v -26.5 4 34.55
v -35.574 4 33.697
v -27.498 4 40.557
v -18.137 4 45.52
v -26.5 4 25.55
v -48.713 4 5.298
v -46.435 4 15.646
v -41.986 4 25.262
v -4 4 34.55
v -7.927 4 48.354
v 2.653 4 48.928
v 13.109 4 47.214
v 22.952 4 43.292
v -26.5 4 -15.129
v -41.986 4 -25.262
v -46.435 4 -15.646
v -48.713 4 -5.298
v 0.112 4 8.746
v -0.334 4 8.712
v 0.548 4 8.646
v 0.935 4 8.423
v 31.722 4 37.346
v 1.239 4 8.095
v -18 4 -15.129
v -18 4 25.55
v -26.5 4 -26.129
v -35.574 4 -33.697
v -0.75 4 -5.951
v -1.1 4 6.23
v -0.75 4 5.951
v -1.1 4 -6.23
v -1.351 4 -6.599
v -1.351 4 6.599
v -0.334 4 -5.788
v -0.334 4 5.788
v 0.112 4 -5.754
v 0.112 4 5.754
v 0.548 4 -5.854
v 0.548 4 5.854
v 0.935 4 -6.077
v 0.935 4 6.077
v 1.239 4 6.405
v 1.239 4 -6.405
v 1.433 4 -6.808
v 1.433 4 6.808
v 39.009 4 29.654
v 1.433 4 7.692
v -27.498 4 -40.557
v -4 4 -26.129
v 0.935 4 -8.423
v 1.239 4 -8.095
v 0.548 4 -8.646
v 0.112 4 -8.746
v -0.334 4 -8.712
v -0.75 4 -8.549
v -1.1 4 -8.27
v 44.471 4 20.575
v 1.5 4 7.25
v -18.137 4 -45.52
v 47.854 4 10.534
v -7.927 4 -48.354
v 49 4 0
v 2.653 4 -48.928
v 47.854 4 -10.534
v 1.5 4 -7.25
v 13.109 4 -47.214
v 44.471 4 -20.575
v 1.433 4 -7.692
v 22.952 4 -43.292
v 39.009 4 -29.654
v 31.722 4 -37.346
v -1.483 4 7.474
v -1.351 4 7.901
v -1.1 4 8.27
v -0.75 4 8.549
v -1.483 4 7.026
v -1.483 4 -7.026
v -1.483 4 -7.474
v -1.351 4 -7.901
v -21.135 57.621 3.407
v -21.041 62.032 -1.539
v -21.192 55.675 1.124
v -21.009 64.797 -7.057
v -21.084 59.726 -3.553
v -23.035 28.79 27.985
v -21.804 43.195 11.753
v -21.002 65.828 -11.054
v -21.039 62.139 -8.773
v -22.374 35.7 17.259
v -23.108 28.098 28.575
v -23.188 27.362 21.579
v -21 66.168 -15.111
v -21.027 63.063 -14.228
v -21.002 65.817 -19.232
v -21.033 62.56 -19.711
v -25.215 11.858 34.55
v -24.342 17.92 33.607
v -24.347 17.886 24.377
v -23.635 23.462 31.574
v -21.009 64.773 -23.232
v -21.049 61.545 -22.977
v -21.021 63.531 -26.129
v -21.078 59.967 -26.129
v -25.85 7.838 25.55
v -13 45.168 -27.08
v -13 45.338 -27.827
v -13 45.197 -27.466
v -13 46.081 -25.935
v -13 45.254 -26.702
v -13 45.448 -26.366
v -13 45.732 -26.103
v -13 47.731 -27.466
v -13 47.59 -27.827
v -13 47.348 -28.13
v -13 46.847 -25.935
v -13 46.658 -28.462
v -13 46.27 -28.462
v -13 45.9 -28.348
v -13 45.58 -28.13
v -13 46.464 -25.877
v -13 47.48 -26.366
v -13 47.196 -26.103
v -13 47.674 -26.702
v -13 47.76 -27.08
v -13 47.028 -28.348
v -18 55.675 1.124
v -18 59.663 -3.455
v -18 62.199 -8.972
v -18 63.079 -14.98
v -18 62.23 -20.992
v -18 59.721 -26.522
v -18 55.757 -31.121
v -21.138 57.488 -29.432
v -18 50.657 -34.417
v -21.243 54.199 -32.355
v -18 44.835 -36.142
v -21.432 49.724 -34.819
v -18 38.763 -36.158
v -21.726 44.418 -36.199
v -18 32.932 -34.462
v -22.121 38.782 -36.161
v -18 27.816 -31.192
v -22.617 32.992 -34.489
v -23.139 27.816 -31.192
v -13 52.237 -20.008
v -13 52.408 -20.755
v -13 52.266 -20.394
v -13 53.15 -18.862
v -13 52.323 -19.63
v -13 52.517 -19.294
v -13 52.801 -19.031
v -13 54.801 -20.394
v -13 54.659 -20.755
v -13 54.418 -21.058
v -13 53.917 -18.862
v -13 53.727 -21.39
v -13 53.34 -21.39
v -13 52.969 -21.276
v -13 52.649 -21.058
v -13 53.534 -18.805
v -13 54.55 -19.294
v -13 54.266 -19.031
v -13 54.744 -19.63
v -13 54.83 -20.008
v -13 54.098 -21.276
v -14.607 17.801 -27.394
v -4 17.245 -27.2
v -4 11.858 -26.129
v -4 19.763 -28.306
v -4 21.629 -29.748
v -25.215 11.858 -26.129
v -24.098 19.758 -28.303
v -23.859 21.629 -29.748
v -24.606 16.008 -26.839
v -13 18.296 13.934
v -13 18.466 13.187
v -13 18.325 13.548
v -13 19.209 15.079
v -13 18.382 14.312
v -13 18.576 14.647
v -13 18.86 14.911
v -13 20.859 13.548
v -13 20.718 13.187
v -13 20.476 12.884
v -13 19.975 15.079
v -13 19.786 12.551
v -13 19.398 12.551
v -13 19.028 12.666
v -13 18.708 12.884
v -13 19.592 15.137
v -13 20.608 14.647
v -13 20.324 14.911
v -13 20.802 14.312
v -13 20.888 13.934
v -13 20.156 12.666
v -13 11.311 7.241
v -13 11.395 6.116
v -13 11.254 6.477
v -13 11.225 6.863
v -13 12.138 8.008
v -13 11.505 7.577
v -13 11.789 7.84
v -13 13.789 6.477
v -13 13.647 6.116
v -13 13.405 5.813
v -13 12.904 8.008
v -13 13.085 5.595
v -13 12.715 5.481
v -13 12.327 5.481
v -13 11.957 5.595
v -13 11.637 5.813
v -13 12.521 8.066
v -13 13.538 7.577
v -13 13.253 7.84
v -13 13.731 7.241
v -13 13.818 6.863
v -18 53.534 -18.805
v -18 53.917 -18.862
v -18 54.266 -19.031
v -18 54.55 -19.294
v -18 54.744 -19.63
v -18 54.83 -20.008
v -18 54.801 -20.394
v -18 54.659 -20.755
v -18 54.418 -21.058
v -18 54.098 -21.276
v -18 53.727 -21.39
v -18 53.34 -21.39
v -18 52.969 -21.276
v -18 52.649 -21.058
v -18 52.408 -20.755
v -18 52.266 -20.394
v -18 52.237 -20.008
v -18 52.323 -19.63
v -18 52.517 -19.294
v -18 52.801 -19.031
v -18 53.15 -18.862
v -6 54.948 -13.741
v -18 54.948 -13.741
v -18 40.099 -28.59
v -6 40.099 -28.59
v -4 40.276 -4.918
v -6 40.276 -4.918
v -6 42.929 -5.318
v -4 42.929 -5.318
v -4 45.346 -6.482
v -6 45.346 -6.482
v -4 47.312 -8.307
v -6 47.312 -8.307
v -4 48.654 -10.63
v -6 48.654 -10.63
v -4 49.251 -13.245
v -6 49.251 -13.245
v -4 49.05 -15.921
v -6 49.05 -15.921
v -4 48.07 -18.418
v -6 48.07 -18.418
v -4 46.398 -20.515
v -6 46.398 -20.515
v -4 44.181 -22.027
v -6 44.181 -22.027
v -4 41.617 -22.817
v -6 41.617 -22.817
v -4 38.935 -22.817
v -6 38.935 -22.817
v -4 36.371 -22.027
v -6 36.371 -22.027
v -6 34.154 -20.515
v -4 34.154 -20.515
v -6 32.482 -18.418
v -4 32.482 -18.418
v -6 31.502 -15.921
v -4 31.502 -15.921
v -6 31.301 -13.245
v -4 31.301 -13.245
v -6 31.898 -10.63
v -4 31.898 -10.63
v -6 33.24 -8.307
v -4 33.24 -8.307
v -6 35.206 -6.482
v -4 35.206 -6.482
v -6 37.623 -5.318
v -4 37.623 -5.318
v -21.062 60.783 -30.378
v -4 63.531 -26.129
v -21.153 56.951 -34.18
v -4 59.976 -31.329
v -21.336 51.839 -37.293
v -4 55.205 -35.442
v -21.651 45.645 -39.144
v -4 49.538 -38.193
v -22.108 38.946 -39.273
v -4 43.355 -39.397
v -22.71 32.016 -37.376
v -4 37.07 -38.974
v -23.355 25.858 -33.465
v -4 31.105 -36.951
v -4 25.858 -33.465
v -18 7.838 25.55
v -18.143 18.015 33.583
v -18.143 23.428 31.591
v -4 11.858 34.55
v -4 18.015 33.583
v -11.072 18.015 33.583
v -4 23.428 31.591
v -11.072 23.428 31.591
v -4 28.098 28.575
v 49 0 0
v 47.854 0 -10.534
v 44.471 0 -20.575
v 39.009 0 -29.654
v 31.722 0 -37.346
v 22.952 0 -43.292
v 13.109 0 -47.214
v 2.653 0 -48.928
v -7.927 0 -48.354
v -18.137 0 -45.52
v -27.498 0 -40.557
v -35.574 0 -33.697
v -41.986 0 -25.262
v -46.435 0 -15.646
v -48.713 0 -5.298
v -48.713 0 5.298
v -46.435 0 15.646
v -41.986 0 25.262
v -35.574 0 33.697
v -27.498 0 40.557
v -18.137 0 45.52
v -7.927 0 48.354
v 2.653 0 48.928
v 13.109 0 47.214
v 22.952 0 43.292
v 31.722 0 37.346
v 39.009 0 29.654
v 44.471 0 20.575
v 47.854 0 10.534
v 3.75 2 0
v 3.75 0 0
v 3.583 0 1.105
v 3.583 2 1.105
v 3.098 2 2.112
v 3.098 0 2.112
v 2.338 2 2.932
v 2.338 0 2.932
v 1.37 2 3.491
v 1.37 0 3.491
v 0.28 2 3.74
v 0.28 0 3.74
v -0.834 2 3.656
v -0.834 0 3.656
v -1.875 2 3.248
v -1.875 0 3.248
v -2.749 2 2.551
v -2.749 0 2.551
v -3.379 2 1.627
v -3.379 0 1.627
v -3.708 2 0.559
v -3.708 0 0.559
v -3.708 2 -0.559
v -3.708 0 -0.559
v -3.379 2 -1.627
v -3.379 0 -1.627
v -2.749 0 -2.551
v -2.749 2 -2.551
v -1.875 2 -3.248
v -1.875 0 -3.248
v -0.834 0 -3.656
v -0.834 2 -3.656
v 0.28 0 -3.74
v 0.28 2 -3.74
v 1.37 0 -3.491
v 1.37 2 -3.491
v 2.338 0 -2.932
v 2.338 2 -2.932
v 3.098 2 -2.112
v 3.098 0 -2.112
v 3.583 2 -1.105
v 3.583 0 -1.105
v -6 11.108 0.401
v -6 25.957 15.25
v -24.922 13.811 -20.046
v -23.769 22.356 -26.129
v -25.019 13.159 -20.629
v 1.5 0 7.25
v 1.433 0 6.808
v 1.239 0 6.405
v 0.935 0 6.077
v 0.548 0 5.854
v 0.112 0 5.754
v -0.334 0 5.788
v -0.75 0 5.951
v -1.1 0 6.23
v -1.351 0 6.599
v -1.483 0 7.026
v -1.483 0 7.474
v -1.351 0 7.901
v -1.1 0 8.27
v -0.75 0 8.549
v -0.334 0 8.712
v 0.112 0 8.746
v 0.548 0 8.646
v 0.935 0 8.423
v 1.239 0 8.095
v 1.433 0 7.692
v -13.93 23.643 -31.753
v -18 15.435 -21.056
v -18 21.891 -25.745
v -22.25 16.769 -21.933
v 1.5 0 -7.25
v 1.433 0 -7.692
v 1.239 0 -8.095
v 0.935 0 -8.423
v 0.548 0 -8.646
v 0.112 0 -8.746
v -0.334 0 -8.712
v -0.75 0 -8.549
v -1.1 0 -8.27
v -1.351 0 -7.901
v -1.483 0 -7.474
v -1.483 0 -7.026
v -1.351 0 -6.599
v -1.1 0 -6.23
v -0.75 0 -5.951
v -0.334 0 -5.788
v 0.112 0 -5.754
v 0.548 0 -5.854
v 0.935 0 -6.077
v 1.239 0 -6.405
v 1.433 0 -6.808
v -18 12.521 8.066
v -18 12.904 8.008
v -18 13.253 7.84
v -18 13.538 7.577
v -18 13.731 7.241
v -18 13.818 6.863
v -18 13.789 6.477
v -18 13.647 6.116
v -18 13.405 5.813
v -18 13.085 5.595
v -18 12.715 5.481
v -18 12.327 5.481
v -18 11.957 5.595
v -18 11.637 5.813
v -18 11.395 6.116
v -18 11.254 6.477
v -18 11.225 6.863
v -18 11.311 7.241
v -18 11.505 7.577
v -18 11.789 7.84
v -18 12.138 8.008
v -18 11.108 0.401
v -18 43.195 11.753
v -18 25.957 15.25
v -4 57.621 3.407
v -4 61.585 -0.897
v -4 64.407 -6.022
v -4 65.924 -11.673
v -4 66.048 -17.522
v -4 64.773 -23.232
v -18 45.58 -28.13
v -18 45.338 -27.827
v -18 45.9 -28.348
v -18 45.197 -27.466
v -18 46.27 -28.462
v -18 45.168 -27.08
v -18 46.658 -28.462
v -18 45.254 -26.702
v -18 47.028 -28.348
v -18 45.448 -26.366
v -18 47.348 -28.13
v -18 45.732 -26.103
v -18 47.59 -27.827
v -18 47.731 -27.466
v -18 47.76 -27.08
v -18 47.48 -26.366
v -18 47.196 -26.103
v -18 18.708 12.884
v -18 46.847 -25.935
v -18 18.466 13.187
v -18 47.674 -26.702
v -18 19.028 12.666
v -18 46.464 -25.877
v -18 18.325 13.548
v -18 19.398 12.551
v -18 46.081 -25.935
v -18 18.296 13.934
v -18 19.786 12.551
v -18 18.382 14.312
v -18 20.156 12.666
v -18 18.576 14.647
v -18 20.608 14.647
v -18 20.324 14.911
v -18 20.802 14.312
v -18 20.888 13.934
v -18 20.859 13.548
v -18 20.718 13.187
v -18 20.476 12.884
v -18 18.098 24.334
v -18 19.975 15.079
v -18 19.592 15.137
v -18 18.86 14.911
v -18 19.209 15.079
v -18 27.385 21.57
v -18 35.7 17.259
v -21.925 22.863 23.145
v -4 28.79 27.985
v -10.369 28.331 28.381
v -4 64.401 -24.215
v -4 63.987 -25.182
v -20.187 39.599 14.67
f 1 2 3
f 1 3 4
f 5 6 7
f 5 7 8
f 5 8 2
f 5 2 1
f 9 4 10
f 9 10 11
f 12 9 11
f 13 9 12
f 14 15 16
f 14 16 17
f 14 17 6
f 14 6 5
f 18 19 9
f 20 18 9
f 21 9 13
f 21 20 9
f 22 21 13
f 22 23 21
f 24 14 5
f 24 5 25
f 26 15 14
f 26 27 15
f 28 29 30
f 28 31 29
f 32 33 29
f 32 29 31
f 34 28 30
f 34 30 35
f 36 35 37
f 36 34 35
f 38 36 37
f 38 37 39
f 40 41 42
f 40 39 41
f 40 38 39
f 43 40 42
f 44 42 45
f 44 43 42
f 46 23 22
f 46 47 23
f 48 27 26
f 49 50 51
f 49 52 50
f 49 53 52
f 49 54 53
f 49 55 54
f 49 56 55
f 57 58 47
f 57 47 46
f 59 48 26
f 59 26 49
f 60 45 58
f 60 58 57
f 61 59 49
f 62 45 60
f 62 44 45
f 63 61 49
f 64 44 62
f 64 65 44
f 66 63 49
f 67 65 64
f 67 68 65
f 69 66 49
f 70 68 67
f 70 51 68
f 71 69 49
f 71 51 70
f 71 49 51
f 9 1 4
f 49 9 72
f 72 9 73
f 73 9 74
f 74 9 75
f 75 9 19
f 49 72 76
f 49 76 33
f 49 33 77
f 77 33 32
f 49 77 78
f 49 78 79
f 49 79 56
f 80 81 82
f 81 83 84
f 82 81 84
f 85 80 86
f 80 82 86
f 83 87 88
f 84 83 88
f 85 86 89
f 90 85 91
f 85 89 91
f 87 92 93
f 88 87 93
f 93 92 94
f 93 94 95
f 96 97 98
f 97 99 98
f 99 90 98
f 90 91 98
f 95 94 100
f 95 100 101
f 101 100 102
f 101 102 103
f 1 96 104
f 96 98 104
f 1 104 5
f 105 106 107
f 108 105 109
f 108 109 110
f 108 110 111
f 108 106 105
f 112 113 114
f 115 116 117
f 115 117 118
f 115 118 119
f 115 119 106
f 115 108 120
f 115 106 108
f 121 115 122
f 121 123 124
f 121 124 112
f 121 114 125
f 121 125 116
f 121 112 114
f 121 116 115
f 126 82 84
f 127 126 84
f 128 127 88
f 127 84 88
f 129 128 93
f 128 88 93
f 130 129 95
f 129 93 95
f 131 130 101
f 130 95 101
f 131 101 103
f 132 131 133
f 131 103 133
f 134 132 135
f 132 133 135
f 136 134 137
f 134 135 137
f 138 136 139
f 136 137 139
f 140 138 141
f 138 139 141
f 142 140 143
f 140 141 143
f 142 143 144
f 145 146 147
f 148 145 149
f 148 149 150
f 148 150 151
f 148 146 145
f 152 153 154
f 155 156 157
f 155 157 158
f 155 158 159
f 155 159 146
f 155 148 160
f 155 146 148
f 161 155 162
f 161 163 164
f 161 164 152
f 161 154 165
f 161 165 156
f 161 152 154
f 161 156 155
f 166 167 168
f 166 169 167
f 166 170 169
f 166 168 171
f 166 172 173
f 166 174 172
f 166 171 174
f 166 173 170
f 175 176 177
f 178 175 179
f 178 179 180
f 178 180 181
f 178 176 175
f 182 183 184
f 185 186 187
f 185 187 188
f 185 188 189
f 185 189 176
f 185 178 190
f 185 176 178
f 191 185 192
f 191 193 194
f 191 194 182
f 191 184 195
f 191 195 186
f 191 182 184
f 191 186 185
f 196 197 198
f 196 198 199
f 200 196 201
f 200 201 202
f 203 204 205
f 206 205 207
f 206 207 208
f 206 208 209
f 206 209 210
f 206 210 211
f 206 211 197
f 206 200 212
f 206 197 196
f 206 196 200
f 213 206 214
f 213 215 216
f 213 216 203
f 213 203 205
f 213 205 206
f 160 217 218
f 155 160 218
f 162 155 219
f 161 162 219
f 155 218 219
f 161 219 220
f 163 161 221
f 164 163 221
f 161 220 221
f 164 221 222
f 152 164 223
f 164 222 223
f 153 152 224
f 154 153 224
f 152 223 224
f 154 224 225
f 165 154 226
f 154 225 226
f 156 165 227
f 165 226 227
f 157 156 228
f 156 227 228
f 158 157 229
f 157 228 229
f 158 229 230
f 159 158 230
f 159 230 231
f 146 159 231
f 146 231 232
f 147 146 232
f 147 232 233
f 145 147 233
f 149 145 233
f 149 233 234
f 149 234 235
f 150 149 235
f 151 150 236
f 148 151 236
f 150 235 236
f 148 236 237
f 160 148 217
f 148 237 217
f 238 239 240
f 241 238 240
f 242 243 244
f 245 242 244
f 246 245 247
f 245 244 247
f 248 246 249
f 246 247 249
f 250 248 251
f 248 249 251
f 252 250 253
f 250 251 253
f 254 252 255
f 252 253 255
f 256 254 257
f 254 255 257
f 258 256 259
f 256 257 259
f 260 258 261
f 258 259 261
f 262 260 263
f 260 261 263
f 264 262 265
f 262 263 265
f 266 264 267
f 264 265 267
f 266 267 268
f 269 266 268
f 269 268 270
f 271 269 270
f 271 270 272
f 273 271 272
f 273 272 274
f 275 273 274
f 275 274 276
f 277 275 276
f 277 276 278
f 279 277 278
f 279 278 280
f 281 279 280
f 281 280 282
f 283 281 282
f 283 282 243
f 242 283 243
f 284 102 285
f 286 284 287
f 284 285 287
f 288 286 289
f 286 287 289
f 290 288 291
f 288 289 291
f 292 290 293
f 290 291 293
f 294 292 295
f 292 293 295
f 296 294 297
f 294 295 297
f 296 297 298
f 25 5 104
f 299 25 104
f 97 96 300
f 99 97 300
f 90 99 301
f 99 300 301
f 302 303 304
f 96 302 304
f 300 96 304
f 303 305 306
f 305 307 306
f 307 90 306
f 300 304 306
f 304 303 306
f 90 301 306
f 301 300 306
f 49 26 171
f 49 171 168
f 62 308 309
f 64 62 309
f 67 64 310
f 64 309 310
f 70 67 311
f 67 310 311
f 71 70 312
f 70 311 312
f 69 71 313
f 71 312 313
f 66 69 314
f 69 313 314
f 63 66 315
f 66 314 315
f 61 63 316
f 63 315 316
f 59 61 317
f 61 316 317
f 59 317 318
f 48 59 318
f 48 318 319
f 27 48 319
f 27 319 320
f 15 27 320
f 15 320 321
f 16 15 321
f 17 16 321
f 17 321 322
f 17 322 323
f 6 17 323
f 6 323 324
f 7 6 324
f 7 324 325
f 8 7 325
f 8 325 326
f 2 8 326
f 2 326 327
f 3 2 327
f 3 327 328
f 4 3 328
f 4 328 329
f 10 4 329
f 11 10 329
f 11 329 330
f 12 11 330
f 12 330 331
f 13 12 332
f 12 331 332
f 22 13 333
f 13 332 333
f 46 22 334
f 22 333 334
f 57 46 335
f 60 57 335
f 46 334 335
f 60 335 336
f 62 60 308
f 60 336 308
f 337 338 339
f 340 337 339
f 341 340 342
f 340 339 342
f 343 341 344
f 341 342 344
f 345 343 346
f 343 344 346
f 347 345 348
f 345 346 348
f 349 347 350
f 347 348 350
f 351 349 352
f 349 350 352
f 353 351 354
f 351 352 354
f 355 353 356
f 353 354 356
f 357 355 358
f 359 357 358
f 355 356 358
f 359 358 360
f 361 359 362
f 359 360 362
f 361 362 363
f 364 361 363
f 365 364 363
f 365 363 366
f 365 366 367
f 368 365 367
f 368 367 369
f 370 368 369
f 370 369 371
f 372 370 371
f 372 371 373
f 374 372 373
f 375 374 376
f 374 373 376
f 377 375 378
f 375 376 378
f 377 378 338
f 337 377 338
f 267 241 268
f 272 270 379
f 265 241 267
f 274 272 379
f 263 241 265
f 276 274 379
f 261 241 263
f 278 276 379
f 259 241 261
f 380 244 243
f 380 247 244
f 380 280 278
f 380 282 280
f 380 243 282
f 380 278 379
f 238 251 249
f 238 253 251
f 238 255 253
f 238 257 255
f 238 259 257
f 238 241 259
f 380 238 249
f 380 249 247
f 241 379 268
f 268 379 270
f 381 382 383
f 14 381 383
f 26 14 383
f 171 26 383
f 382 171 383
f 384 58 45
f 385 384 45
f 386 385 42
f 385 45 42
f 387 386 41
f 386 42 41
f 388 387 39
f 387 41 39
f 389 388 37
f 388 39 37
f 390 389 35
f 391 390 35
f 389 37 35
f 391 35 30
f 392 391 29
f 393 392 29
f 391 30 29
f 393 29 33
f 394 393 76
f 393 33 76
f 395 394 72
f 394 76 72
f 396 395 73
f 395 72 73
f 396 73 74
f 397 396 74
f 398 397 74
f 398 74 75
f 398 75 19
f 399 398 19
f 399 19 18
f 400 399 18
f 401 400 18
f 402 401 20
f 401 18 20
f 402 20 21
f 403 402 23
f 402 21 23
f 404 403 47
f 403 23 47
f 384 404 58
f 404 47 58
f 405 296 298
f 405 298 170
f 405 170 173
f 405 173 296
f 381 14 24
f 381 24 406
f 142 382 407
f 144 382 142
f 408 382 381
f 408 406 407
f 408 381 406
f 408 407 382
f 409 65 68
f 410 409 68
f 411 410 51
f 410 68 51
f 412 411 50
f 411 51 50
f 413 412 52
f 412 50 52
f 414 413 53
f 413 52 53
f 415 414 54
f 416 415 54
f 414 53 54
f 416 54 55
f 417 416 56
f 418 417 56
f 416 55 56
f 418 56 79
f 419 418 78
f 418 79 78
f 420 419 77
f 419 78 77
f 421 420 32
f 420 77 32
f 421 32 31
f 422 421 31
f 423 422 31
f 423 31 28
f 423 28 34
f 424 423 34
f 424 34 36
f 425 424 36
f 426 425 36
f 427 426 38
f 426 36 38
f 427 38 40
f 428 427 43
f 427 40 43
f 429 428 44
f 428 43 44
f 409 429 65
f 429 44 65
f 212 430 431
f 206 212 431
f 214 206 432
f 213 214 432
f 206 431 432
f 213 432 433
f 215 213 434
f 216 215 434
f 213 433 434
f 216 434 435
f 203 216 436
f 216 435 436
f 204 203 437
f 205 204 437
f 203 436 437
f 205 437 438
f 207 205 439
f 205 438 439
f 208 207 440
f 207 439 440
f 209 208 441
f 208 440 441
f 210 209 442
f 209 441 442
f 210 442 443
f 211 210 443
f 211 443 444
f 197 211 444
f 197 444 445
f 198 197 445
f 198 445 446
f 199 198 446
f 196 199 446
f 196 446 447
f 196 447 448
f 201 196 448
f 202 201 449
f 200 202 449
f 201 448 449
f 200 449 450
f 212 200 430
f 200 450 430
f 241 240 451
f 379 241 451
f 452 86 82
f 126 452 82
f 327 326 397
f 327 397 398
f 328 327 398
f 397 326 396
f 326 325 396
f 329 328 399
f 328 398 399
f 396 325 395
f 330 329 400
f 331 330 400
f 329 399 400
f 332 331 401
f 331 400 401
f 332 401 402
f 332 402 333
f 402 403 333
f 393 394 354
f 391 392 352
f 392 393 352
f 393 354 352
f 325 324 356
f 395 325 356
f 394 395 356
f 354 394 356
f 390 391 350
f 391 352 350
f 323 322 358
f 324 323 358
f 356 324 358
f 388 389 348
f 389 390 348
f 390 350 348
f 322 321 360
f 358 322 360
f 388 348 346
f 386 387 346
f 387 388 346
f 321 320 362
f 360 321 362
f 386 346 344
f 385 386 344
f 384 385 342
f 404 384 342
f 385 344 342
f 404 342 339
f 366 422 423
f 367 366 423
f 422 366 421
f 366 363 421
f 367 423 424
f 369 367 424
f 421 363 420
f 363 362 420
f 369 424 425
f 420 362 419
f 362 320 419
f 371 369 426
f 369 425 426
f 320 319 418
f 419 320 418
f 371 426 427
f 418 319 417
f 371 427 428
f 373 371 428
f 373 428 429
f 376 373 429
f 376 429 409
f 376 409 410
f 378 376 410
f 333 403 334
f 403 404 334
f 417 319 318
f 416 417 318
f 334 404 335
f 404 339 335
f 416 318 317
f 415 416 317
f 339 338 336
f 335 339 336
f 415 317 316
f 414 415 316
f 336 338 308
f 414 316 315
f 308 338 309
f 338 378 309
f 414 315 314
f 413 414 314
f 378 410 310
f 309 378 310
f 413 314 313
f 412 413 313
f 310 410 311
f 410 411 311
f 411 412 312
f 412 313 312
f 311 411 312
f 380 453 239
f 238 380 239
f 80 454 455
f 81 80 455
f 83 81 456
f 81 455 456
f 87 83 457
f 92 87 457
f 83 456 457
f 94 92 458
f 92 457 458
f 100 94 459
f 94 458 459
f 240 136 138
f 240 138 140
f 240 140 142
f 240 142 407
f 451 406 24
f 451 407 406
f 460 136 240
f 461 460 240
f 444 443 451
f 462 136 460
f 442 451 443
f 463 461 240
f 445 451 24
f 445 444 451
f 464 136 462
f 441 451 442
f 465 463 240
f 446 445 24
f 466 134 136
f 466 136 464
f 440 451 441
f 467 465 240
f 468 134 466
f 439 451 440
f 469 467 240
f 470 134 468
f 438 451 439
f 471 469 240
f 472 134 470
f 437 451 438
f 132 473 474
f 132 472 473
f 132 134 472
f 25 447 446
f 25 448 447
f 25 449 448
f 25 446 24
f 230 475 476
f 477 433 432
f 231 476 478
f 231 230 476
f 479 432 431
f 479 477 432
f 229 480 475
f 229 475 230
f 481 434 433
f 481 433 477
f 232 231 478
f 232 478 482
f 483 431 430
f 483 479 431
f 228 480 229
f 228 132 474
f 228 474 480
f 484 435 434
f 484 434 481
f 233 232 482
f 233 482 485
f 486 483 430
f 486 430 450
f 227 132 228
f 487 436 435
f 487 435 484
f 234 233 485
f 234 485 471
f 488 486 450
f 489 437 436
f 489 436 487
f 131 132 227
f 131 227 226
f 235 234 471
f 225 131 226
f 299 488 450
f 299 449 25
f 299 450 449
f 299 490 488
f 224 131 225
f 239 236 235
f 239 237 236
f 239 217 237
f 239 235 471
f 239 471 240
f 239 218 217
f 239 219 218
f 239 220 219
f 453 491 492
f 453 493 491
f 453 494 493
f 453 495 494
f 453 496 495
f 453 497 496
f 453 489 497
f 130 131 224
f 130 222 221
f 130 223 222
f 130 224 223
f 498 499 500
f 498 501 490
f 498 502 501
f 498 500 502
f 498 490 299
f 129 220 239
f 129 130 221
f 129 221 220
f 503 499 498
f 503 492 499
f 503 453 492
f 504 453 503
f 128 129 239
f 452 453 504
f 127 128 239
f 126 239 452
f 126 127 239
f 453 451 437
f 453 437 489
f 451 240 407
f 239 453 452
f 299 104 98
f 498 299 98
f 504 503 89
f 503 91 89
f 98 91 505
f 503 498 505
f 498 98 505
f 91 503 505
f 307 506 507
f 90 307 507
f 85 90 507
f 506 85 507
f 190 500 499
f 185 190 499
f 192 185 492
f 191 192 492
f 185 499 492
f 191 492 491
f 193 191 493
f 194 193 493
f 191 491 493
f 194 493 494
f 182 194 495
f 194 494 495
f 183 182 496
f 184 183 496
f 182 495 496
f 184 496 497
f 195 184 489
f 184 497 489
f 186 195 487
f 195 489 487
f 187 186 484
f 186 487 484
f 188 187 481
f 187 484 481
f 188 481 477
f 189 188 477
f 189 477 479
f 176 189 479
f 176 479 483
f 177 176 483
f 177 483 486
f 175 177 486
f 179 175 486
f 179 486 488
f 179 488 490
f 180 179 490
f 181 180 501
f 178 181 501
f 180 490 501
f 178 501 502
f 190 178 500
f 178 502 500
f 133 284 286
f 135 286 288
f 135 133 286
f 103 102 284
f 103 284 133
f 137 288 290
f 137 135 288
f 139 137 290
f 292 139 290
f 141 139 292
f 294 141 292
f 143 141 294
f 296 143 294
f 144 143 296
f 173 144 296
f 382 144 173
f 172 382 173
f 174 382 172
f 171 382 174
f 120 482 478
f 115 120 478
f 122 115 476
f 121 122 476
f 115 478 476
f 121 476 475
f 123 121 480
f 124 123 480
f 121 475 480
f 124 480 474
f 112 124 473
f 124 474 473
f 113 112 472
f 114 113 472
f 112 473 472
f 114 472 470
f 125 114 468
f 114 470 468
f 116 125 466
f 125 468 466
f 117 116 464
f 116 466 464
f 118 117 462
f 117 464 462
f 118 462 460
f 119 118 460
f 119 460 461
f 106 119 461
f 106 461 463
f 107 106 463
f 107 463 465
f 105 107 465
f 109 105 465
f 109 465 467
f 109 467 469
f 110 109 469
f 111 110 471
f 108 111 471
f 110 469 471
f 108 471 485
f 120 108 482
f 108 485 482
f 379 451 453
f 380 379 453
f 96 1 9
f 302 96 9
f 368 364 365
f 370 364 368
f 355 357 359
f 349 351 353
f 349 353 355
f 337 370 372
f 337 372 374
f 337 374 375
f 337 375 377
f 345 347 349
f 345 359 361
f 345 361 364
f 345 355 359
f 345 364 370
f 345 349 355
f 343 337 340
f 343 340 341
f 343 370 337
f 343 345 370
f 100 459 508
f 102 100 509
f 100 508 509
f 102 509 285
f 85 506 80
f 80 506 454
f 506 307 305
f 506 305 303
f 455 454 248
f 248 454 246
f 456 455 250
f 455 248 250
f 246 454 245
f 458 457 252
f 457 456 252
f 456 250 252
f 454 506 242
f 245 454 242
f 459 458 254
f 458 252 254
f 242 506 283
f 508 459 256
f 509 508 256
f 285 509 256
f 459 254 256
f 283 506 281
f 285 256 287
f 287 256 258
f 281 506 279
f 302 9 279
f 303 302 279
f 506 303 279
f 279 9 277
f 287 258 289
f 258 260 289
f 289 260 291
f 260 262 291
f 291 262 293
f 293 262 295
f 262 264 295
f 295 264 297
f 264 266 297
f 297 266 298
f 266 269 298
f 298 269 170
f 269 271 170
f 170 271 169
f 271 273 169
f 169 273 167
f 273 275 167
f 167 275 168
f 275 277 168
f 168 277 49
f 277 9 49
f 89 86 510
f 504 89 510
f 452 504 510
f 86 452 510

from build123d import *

# Parameters (mm, degrees)
CROQUIS1_R                 = 49
SALIENTE_EXTRUIR1_DEPTH    = 4
CROQUIS2_R                 = 1.5
CORTAR_EXTRUIR1_DEPTH      = 4
CROQUIS3_W                 = 22.5
CROQUIS3_H                 = 60.679
SALIENTE_EXTRUIR2_DEPTH    = 60.773
SALIENTE_EXTRUIR3_DEPTH    = 22.5
CORTAR_EXTRUIR2_DEPTH      = 22.5
CORTAR_EXTRUIR5_DEPTH      = 8.5
CORTAR_EXTRUIR6_DEPTH      = 29.5
CORTAR_EXTRUIR6_DEPTH_BACK = 78.5
CORTAR_EXTRUIR7_DEPTH      = 12
CORTAR_EXTRUIR8_REACH      = 57
CROQUIS12_R                = 9
CROQUIS13_R                = 1.3
CORTAR_EXTRUIR9_DEPTH      = 5
CROQUIS14_R                = 3.75
CORTAR_EXTRUIR10_DEPTH     = 2


with BuildPart() as part:
    # Croquis1 → Saliente-Extruir1 (new body)
    with BuildSketch(Plane(origin=(0, 0, 0), x_dir=(1, 0, 0), z_dir=(0, 1, 0))):
        Circle(CROQUIS1_R)
    extrude(amount=SALIENTE_EXTRUIR1_DEPTH)

    # Croquis2 → Cortar-Extruir1 (cut)
    with BuildSketch(Plane(origin=(0, 4, 0), x_dir=(1, 0, 0), z_dir=(0, 1, 0))):
        with Locations((0, 7.25)):
            Circle(CROQUIS2_R)
        with Locations((0, -7.25)):
            Circle(CROQUIS2_R)
    extrude(amount=-CORTAR_EXTRUIR1_DEPTH, mode=Mode.SUBTRACT)

    # Croquis3 → Saliente-Extruir2 (add)
    with BuildSketch(Plane(origin=(0, 4, 0), x_dir=(1, 0, 0), z_dir=(0, 1, 0))):
        with Locations((-15.25, -4.2105)):
            Rectangle(CROQUIS3_W, CROQUIS3_H)
    extrude(amount=SALIENTE_EXTRUIR2_DEPTH)

    # Croquis4 → Saliente-Extruir3 (add)
    with BuildSketch(Plane(origin=(-4, 0, 0), x_dir=(0, 0, -1), z_dir=(1, 0, 0))):
        with BuildLine():
            Line((-34.55, 4), (-34.55, 11.858))
            add(Edge.make_bspline(
                [(-34.55, 11.858), (-34.026556698, 21.514345964), (-28.575, 28.098)],
                knots=[0, 0, 0, 0.824435894, 0.824435894, 0.824435894], degree=2))
            Line((-28.575, 28.098), (-3.407, 57.621))
            ThreePointArc((-3.407, 57.621), (30.992681607, 60.270900315), (33.465, 25.858))
            add(Edge.make_bspline(
                [(29.748, 21.629), (31.899002628, 23.543234873), (33.465, 25.858)],
                knots=[0, 0, 0, 0.522921898, 0.522921898, 0.522921898], degree=2))
            add(Edge.make_bspline(
                [(26.129, 11.858), (26.849165043, 18.857512826), (29.748, 21.629)],
                knots=[0, 0, 0, 0.117772871, 0.117772871, 0.117772871], degree=2))
            Line((26.129, 11.858), (26.129, 4))
            Line((26.129, 4), (-34.55, 4))
        make_face()
    extrude(amount=-SALIENTE_EXTRUIR3_DEPTH)

    # Croquis5 → Cortar-Extruir2 (cut)
    with BuildSketch(Plane(origin=(-4, 0, 0), x_dir=(0, 0, -1), z_dir=(1, 0, 0))):
        with BuildLine():
            Line((-27.985060499, 28.790020974), (-3.407, 57.621))
            ThreePointArc((-3.407, 57.621), (1.319630754, 61.88266891), (6.989626025, 64.773))
            Line((6.989626025, 64.773), (-34.55, 64.773))
            Line((-34.55, 64.773), (-34.55, 11.858))
            add(Edge.make_bspline(
                [(-34.55, 11.858), (-34.095195054, 18.386707566), (-32.103528387, 23.800040899), (-28.575, 28.098)],
                knots=[0, 0, 0, 0, 0.605648705, 0.605648705, 0.605648705, 0.605648705], degree=3))
            add(Edge.make_bspline(
                [(-28.575, 28.098), (-28.382908254, 28.331979262), (-28.186261754, 28.56265292), (-27.985060499, 28.790020974)],
                knots=[0.605648705, 0.605648705, 0.605648705, 0.605648705, 0.638619991, 0.638619991, 0.638619991, 0.638619991], degree=3))
        make_face()
        with BuildLine():
            ThreePointArc((23.232314116, 64.773), (24.700788316, 64.198896251), (26.129, 63.530897014))
            Line((26.129, 63.530897014), (26.129, 64.773))
            Line((26.129, 64.773), (23.232314116, 64.773))
        make_face()
    extrude(amount=-CORTAR_EXTRUIR2_DEPTH, mode=Mode.SUBTRACT)

    # Croquis9 → Cortar-Extruir5 (cut)
    with BuildSketch(Plane.ZY.offset(26.5)):
        with BuildLine():
            Line((25.55, 4), (25.55, 7.838))
            add(Edge.make_bspline(
                [(25.55, 7.838), (24.886302853, 23.956871559), (17.259, 35.7)],
                knots=[0, 0, 0, 0.526933163, 0.526933163, 0.526933163], degree=2))
            add(Edge.make_bspline(
                [(17.259, 35.7), (14.834185302, 39.750302487), (11.753, 43.195)],
                knots=[0, 0, 0, 0.431108937, 0.431108937, 0.431108937], degree=2))
            Line((11.753, 43.195), (1.123987272, 55.674759295))
            ThreePointArc((1.123987272, 55.674759295), (-28.963418372, 57.90340371), (-31.192062787, 27.815998066))
            add(Edge.make_bspline(
                [(-15.129, 4), (-20.706034624, 17.629178957), (-31.192062787, 27.815998066)],
                knots=[0, 0, 0, 1, 1, 1], degree=2))
            Line((-15.129, 4), (25.55, 4))
        make_face()
    extrude(amount=-CORTAR_EXTRUIR5_DEPTH, mode=Mode.SUBTRACT)

    # Croquis10 → Cortar-Extruir6 (cut, two sides)
    with BuildSketch(Plane(origin=(0, 0, -26.129), x_dir=(-1, 0, 0), z_dir=(0, 0, -1))) as cortar_extruir6_sk:
        with BuildLine():
            Line((21, 66.168251112), (26.5, 66.168251112))
            Line((26.5, 66.168251112), (26.5, 4))
            add(Edge.make_bspline(
                [(21, 66.168251112), (21.140868098, 34.670825733), (26.5, 4)],
                knots=[0, 0, 0, 0.615166298, 0.615166298, 0.615166298], degree=2))
        make_face()
    extrude(amount=CORTAR_EXTRUIR6_DEPTH, mode=Mode.SUBTRACT)
    extrude(cortar_extruir6_sk.sketch, amount=-CORTAR_EXTRUIR6_DEPTH_BACK, mode=Mode.SUBTRACT)

    # Croquis11 → Cortar-Extruir7 (cut)
    with BuildSketch(Plane.ZY.offset(18)):
        Polygon((0.401, 11.108), (15.25, 25.957), (-13.741, 54.948), (-28.59, 40.099), align=None)
    extrude(amount=-CORTAR_EXTRUIR7_DEPTH, mode=Mode.SUBTRACT)

    # Croquis12 → Cortar-Extruir8 (cut, up to next)
    with BuildSketch(Plane.ZY.offset(6), mode=Mode.PRIVATE) as cortar_extruir8_sk1:
        with Locations((-13.918, 40.276)):
            Circle(CROQUIS12_R)
    cortar_extruir8_tool1 = extrude(cortar_extruir8_sk1.sketch, amount=-CORTAR_EXTRUIR8_REACH, mode=Mode.PRIVATE) & part.part
    add(cortar_extruir8_tool1.solids().sort_by_distance((-6, 40.276, -13.918))[0], mode=Mode.SUBTRACT)

    # Croquis13 → Cortar-Extruir9 (cut)
    with BuildSketch(Plane.ZY.offset(18)):
        with Locations((-27.176836773, 46.464011366)):
            Circle(CROQUIS13_R)
        with Locations((-20.104694437, 53.533519844)):
            Circle(CROQUIS13_R)
        with Locations((6.766011366, 12.521163227)):
            Circle(CROQUIS13_R)
        with Locations((13.836836773, 19.591988634)):
            Circle(CROQUIS13_R)
    extrude(amount=-CORTAR_EXTRUIR9_DEPTH, mode=Mode.SUBTRACT)

    # Croquis14 → Cortar-Extruir10 (cut)
    with BuildSketch(Plane.XZ):
        Circle(CROQUIS14_R)
    extrude(amount=-CORTAR_EXTRUIR10_DEPTH, mode=Mode.SUBTRACT)


solid = part.part
